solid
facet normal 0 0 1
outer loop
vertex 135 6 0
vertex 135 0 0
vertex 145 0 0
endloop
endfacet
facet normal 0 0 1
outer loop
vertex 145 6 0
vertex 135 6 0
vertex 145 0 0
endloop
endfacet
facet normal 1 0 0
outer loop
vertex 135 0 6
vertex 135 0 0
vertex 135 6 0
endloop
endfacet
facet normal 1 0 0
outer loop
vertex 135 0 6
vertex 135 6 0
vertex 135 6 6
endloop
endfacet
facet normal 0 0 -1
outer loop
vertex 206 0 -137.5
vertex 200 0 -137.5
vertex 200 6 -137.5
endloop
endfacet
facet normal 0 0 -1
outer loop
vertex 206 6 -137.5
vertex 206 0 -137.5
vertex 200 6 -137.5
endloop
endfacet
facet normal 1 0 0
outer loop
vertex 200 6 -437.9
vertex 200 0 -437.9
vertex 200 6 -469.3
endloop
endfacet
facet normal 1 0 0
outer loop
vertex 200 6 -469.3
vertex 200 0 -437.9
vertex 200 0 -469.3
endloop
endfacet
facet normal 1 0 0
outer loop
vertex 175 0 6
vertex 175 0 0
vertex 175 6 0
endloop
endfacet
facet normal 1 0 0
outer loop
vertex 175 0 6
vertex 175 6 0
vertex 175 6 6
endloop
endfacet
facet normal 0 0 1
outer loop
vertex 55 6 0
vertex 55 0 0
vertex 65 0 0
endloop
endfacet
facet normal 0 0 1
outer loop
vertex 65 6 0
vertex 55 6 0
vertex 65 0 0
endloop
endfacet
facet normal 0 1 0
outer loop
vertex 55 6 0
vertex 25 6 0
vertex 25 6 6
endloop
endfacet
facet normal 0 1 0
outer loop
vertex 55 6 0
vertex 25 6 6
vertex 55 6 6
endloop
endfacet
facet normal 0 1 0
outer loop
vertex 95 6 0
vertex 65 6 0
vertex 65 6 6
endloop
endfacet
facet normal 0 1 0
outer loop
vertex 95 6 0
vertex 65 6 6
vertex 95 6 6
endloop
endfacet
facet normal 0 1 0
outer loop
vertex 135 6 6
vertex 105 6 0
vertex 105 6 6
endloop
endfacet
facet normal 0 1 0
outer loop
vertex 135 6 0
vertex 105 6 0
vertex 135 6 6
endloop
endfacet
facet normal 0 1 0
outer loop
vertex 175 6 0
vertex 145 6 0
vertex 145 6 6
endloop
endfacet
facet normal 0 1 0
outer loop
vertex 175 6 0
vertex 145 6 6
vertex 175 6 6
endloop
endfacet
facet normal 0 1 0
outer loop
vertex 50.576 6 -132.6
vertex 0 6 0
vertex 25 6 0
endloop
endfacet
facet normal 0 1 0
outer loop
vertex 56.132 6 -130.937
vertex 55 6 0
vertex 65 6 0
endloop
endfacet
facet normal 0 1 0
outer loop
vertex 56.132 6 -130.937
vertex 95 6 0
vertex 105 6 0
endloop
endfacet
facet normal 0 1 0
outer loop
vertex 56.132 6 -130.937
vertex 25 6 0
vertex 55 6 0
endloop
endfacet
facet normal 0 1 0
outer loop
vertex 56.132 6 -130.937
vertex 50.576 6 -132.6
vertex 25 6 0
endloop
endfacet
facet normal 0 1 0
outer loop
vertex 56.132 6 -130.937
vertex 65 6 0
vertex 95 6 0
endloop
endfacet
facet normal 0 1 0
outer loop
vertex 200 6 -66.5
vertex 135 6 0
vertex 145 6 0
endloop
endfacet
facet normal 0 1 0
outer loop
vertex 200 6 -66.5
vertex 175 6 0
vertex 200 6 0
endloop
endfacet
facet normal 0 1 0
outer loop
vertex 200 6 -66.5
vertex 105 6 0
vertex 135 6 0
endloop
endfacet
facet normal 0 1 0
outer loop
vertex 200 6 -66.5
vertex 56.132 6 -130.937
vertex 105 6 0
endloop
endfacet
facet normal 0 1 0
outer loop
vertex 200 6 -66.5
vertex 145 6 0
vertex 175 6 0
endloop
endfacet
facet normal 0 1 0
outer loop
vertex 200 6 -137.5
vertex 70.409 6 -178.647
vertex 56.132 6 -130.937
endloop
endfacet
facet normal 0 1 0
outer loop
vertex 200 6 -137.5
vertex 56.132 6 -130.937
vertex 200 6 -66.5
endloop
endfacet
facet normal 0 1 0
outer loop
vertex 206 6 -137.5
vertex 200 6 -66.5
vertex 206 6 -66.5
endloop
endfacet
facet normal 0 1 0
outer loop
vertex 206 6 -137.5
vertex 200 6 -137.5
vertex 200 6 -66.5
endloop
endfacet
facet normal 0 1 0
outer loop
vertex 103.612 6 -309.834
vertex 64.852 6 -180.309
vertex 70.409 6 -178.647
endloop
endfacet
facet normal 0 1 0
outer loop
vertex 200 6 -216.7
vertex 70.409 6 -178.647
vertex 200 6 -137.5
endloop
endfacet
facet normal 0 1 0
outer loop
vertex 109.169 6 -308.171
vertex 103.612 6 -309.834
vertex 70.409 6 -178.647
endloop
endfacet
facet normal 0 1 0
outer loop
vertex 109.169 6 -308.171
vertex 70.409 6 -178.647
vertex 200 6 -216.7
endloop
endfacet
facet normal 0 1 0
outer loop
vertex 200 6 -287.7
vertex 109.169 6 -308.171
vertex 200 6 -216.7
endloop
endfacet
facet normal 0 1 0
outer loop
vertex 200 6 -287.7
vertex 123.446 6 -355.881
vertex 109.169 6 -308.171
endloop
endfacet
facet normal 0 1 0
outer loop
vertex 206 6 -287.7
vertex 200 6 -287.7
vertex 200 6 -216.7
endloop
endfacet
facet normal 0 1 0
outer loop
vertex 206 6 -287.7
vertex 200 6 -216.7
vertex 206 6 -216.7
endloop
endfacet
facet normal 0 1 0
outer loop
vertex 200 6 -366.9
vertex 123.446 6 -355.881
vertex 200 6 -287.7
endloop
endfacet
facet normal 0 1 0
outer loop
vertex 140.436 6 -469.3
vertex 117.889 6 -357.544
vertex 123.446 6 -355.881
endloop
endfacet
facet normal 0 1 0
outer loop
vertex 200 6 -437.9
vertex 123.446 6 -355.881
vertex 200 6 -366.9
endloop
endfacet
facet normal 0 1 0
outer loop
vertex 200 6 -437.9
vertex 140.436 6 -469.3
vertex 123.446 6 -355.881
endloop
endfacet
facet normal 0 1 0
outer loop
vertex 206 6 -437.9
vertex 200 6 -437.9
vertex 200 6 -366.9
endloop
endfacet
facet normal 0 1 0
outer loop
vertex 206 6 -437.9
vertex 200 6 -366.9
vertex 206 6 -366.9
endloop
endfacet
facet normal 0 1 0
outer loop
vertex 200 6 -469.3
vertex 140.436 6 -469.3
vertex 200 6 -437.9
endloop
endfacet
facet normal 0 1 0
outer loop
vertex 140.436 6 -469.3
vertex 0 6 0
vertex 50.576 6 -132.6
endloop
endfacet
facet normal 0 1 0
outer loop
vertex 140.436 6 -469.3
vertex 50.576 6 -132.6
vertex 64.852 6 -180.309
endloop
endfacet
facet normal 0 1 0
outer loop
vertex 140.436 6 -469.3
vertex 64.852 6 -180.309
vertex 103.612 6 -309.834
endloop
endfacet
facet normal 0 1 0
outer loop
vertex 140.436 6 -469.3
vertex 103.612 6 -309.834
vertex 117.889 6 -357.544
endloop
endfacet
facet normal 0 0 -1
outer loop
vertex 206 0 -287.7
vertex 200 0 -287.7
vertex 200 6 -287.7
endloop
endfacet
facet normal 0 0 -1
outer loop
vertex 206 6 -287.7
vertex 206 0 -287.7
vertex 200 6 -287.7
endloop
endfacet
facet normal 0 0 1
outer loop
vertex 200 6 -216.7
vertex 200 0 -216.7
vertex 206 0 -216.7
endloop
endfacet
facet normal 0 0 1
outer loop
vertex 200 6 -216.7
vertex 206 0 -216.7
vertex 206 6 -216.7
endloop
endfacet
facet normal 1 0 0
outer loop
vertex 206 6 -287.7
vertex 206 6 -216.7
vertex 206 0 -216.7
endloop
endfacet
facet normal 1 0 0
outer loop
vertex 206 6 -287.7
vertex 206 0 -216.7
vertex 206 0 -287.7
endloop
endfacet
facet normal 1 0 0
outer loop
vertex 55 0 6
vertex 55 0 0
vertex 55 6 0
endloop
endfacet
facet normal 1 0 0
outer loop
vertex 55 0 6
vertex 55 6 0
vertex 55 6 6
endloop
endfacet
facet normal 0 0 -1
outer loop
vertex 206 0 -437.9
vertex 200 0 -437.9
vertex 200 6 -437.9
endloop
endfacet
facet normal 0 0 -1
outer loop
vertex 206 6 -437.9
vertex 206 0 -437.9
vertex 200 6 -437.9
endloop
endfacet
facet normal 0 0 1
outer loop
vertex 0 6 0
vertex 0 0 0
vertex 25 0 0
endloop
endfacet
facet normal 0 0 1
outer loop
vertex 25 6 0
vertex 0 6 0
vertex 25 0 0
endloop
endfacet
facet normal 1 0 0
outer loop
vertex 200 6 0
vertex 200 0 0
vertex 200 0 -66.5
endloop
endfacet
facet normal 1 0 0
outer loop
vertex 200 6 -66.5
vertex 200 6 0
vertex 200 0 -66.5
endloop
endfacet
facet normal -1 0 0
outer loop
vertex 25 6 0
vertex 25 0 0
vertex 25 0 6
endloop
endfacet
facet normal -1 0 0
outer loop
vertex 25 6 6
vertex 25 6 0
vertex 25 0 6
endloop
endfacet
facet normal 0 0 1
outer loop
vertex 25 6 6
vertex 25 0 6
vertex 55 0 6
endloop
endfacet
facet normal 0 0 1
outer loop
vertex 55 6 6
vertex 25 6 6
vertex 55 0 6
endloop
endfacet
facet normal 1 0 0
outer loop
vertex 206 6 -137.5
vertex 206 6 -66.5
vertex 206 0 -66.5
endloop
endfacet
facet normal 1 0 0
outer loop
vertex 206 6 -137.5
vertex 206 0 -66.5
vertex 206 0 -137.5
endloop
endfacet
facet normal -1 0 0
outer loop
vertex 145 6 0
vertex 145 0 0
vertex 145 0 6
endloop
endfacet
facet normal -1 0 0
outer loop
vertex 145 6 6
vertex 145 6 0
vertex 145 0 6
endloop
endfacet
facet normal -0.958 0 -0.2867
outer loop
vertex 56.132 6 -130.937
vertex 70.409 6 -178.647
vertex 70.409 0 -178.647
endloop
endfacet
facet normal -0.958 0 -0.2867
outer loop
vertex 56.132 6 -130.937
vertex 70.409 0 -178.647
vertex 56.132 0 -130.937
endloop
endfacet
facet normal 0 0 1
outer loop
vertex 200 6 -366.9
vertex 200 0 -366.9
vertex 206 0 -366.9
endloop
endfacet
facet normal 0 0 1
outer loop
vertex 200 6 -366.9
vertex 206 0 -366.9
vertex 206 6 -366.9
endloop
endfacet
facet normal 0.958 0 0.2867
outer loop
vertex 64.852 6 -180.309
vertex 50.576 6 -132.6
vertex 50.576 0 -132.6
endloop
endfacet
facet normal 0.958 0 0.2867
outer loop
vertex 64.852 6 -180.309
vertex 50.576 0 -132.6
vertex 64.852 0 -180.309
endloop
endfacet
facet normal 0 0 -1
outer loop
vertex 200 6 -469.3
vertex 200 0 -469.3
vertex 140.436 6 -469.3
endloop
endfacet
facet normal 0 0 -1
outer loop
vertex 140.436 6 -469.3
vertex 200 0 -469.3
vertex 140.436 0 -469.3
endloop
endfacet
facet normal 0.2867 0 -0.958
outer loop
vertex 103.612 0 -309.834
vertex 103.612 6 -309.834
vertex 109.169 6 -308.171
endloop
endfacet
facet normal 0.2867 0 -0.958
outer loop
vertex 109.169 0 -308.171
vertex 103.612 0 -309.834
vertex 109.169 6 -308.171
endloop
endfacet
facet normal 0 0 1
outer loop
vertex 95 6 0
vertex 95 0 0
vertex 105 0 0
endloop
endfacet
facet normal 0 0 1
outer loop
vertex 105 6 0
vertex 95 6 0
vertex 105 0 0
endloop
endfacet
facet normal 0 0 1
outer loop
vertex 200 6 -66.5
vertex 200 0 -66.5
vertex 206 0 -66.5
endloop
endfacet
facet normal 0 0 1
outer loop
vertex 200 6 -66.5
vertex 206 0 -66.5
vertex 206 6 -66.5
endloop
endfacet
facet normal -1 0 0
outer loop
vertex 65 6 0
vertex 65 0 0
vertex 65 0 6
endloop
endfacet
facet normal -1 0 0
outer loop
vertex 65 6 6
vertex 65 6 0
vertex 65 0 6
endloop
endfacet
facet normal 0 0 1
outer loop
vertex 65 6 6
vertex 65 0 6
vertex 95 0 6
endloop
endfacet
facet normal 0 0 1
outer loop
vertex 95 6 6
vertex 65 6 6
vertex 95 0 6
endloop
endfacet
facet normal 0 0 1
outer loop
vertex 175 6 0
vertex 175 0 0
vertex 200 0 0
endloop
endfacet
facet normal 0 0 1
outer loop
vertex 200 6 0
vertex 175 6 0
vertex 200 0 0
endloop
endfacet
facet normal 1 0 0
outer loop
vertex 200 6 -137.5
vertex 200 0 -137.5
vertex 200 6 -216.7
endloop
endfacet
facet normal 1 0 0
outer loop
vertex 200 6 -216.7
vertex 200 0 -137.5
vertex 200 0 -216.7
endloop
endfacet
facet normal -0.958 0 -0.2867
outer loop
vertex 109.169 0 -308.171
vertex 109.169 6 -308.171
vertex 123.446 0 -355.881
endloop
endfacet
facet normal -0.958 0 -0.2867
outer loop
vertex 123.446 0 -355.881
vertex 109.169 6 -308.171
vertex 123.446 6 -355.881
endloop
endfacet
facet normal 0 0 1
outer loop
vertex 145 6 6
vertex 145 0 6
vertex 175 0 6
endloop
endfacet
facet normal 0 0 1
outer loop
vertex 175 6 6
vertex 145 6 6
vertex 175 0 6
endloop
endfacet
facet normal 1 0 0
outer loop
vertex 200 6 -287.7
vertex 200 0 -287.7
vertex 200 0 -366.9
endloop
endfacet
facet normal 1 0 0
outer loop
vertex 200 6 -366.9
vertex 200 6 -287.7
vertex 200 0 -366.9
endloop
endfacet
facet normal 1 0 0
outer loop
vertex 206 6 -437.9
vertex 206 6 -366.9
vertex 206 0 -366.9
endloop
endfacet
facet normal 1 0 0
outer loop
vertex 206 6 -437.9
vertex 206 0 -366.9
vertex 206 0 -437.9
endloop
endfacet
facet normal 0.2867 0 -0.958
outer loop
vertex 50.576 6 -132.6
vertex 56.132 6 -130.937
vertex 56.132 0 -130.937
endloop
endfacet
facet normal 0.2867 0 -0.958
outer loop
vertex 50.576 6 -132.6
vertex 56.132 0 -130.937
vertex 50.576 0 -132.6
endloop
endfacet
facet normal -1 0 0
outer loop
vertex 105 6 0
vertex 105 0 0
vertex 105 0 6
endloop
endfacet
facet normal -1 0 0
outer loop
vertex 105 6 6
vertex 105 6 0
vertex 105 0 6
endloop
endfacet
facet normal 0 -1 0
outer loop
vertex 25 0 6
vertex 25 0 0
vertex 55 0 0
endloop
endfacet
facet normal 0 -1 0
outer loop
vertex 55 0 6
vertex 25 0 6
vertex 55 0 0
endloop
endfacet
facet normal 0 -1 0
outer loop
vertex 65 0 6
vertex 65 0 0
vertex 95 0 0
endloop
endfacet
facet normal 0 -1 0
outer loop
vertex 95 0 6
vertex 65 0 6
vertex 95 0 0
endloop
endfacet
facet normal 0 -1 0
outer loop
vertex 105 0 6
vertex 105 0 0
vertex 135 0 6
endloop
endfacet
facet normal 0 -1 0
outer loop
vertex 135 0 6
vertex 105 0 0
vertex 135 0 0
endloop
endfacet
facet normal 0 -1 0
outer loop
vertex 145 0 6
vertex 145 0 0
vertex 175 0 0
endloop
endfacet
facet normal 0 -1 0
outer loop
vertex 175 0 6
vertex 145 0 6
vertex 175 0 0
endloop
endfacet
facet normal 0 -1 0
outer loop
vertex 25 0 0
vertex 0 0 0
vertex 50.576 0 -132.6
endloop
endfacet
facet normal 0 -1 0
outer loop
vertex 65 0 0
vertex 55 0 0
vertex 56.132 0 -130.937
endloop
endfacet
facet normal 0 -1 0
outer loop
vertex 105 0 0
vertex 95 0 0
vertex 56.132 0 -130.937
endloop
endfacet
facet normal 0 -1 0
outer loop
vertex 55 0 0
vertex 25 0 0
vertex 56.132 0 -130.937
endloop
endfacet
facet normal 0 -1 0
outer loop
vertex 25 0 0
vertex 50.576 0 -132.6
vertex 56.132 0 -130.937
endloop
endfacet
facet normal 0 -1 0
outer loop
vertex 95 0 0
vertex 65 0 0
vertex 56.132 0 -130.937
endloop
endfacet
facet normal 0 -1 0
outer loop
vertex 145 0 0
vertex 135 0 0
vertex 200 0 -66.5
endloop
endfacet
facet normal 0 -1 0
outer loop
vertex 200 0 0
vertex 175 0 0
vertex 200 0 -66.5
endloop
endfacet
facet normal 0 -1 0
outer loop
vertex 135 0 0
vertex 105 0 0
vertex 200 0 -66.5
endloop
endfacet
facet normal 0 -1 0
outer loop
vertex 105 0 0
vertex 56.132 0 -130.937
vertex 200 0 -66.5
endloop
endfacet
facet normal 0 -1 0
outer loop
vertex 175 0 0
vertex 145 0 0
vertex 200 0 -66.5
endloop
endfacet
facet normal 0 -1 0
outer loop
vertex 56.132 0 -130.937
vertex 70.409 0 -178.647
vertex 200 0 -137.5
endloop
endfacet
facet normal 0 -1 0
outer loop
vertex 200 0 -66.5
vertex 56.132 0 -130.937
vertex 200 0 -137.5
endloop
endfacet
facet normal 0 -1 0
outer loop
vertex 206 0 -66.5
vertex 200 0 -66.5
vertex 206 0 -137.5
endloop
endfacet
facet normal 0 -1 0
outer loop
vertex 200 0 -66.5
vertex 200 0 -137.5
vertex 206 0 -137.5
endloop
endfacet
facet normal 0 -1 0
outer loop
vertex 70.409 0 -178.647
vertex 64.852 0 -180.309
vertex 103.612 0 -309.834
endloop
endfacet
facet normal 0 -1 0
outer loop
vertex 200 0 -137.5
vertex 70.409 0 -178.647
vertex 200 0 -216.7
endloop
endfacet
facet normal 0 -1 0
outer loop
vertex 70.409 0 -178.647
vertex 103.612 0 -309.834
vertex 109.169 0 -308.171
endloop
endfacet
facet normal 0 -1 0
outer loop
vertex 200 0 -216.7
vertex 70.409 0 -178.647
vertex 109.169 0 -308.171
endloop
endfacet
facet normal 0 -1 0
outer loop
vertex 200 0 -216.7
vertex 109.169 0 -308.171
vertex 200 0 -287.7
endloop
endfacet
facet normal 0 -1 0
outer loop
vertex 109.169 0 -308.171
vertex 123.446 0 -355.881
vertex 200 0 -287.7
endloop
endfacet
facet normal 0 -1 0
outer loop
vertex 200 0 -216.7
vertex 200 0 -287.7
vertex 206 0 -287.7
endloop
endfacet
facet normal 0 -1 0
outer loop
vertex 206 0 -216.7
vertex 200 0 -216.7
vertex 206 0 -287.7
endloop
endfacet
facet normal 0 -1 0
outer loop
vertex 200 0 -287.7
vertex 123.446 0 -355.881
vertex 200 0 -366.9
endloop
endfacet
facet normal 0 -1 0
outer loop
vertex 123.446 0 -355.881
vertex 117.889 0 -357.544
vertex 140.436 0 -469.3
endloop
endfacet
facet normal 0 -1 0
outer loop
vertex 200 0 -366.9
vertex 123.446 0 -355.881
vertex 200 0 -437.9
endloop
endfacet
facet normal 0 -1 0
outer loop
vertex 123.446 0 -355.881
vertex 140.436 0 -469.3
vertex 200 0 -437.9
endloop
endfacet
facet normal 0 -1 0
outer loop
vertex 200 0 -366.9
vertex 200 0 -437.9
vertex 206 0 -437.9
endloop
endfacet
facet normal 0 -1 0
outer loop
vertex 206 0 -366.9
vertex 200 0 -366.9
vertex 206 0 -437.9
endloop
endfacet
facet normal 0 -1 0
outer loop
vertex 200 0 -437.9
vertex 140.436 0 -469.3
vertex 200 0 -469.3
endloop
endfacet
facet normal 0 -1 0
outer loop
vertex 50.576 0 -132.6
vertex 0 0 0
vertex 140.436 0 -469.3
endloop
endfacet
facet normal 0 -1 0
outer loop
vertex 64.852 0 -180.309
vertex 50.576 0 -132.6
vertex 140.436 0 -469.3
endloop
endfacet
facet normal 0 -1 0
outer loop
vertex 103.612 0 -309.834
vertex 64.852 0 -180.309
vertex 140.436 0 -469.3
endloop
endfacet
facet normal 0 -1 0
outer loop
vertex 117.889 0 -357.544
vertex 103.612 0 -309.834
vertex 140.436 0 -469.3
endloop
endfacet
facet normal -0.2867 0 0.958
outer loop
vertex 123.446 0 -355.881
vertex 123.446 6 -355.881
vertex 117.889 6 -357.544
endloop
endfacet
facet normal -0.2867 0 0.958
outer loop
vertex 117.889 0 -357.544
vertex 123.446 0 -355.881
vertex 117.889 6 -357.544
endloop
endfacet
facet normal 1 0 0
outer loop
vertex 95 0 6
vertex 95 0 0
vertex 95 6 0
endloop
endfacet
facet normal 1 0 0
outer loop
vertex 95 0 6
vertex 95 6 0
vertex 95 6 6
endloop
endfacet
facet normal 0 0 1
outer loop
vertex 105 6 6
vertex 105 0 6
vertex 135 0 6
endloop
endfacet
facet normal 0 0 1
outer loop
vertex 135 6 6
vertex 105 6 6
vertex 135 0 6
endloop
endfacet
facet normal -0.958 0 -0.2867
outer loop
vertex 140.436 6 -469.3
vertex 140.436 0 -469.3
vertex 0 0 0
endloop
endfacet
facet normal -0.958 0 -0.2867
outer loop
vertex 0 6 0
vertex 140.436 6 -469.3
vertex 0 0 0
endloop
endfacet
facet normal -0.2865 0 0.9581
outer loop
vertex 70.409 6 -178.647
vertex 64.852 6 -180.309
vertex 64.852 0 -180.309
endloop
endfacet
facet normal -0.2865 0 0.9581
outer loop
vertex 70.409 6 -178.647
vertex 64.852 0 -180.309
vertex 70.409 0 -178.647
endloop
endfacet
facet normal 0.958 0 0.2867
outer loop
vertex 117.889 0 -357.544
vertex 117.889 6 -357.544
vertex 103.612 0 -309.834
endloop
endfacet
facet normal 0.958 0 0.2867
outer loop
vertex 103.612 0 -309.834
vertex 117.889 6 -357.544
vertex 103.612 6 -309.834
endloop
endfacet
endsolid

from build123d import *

# Parameters (mm, degrees)
BOSS_EXTRUDE1_DEPTH   = 6
SKETCH2_W             = 71
SKETCH2_H             = 6
BOSS_EXTRUDE2_DEPTH   = 6
CUT_EXTRUDE1_DEPTH    = 6
SKETCH5_W             = 30
SKETCH5_H             = 6
BOSS_EXTRUDE3_DEPTH   = 6
BOSS_EXTRUDE3_2_DEPTH = 6
BOSS_EXTRUDE3_3_DEPTH = 6
BOSS_EXTRUDE3_4_DEPTH = 6


with BuildPart() as part:
    # Sketch1 → Boss-Extrude1 (new body)
    with BuildSketch(Plane(origin=(0, 0, 0), x_dir=(1, 0, 0), z_dir=(0, 1, 0))):
        Polygon((200, 469.3), (140.436469322, 469.3), (0, 0), (200, 0), align=None)
    extrude(amount=BOSS_EXTRUDE1_DEPTH)

    # Sketch2 → Boss-Extrude2 (add)
    with BuildSketch(Plane(origin=(200, 0, 0), x_dir=(0, 0, -1), z_dir=(1, 0, 0))):
        with Locations((402.4, 3)):
            Rectangle(SKETCH2_W, SKETCH2_H)
        with Locations((252.2, 3)):
            Rectangle(SKETCH2_W, SKETCH2_H)
        with Locations((102, 3)):
            Rectangle(SKETCH2_W, SKETCH2_H)
    extrude(amount=BOSS_EXTRUDE2_DEPTH)

    # Sketch4 → Cut-Extrude1 (cut)
    with BuildSketch(Plane(origin=(0, 6, 0), x_dir=(1, 0, 0), z_dir=(0, 1, 0))):
        Polygon((123.445854535, 355.88111854), (117.889311346, 357.54389567), (103.612362884, 309.834266216), (109.168906073, 308.171489086), align=None)
        Polygon((56.132049338, 130.936921838), (50.575506148, 132.599698968), (64.85245461, 180.309328422), (70.4089978, 178.646551292), align=None)
    extrude(amount=-CUT_EXTRUDE1_DEPTH, mode=Mode.SUBTRACT)


with BuildPart() as body_2:
    # Sketch5 → Boss-Extrude3 (new body)
    with BuildSketch(Plane.XZ):
        with Locations((160, 3)):
            Rectangle(SKETCH5_W, SKETCH5_H)
    extrude(amount=-BOSS_EXTRUDE3_DEPTH)


with BuildPart() as body_3:
    # Sketch5 → Boss-Extrude3 2 (new body)
    with BuildSketch(Plane.XZ):
        with Locations((120, 3)):
            Rectangle(SKETCH5_W, SKETCH5_H)
    extrude(amount=-BOSS_EXTRUDE3_2_DEPTH)


with BuildPart() as body_4:
    # Sketch5 → Boss-Extrude3 3 (new body)
    with BuildSketch(Plane.XZ):
        with Locations((80, 3)):
            Rectangle(SKETCH5_W, SKETCH5_H)
    extrude(amount=-BOSS_EXTRUDE3_3_DEPTH)


with BuildPart() as body_5:
    # Sketch5 → Boss-Extrude3 4 (new body)
    with BuildSketch(Plane.XZ):
        with Locations((40, 3)):
            Rectangle(SKETCH5_W, SKETCH5_H)
    extrude(amount=-BOSS_EXTRUDE3_4_DEPTH)


with BuildPart() as body_3_1:
    add(body_3.part)

    # Combine1: union body 2, body 4, body 5, part
    add(body_2.part)
    add(body_4.part)
    add(body_5.part)
    add(part.part)


solid = body_3_1.part
